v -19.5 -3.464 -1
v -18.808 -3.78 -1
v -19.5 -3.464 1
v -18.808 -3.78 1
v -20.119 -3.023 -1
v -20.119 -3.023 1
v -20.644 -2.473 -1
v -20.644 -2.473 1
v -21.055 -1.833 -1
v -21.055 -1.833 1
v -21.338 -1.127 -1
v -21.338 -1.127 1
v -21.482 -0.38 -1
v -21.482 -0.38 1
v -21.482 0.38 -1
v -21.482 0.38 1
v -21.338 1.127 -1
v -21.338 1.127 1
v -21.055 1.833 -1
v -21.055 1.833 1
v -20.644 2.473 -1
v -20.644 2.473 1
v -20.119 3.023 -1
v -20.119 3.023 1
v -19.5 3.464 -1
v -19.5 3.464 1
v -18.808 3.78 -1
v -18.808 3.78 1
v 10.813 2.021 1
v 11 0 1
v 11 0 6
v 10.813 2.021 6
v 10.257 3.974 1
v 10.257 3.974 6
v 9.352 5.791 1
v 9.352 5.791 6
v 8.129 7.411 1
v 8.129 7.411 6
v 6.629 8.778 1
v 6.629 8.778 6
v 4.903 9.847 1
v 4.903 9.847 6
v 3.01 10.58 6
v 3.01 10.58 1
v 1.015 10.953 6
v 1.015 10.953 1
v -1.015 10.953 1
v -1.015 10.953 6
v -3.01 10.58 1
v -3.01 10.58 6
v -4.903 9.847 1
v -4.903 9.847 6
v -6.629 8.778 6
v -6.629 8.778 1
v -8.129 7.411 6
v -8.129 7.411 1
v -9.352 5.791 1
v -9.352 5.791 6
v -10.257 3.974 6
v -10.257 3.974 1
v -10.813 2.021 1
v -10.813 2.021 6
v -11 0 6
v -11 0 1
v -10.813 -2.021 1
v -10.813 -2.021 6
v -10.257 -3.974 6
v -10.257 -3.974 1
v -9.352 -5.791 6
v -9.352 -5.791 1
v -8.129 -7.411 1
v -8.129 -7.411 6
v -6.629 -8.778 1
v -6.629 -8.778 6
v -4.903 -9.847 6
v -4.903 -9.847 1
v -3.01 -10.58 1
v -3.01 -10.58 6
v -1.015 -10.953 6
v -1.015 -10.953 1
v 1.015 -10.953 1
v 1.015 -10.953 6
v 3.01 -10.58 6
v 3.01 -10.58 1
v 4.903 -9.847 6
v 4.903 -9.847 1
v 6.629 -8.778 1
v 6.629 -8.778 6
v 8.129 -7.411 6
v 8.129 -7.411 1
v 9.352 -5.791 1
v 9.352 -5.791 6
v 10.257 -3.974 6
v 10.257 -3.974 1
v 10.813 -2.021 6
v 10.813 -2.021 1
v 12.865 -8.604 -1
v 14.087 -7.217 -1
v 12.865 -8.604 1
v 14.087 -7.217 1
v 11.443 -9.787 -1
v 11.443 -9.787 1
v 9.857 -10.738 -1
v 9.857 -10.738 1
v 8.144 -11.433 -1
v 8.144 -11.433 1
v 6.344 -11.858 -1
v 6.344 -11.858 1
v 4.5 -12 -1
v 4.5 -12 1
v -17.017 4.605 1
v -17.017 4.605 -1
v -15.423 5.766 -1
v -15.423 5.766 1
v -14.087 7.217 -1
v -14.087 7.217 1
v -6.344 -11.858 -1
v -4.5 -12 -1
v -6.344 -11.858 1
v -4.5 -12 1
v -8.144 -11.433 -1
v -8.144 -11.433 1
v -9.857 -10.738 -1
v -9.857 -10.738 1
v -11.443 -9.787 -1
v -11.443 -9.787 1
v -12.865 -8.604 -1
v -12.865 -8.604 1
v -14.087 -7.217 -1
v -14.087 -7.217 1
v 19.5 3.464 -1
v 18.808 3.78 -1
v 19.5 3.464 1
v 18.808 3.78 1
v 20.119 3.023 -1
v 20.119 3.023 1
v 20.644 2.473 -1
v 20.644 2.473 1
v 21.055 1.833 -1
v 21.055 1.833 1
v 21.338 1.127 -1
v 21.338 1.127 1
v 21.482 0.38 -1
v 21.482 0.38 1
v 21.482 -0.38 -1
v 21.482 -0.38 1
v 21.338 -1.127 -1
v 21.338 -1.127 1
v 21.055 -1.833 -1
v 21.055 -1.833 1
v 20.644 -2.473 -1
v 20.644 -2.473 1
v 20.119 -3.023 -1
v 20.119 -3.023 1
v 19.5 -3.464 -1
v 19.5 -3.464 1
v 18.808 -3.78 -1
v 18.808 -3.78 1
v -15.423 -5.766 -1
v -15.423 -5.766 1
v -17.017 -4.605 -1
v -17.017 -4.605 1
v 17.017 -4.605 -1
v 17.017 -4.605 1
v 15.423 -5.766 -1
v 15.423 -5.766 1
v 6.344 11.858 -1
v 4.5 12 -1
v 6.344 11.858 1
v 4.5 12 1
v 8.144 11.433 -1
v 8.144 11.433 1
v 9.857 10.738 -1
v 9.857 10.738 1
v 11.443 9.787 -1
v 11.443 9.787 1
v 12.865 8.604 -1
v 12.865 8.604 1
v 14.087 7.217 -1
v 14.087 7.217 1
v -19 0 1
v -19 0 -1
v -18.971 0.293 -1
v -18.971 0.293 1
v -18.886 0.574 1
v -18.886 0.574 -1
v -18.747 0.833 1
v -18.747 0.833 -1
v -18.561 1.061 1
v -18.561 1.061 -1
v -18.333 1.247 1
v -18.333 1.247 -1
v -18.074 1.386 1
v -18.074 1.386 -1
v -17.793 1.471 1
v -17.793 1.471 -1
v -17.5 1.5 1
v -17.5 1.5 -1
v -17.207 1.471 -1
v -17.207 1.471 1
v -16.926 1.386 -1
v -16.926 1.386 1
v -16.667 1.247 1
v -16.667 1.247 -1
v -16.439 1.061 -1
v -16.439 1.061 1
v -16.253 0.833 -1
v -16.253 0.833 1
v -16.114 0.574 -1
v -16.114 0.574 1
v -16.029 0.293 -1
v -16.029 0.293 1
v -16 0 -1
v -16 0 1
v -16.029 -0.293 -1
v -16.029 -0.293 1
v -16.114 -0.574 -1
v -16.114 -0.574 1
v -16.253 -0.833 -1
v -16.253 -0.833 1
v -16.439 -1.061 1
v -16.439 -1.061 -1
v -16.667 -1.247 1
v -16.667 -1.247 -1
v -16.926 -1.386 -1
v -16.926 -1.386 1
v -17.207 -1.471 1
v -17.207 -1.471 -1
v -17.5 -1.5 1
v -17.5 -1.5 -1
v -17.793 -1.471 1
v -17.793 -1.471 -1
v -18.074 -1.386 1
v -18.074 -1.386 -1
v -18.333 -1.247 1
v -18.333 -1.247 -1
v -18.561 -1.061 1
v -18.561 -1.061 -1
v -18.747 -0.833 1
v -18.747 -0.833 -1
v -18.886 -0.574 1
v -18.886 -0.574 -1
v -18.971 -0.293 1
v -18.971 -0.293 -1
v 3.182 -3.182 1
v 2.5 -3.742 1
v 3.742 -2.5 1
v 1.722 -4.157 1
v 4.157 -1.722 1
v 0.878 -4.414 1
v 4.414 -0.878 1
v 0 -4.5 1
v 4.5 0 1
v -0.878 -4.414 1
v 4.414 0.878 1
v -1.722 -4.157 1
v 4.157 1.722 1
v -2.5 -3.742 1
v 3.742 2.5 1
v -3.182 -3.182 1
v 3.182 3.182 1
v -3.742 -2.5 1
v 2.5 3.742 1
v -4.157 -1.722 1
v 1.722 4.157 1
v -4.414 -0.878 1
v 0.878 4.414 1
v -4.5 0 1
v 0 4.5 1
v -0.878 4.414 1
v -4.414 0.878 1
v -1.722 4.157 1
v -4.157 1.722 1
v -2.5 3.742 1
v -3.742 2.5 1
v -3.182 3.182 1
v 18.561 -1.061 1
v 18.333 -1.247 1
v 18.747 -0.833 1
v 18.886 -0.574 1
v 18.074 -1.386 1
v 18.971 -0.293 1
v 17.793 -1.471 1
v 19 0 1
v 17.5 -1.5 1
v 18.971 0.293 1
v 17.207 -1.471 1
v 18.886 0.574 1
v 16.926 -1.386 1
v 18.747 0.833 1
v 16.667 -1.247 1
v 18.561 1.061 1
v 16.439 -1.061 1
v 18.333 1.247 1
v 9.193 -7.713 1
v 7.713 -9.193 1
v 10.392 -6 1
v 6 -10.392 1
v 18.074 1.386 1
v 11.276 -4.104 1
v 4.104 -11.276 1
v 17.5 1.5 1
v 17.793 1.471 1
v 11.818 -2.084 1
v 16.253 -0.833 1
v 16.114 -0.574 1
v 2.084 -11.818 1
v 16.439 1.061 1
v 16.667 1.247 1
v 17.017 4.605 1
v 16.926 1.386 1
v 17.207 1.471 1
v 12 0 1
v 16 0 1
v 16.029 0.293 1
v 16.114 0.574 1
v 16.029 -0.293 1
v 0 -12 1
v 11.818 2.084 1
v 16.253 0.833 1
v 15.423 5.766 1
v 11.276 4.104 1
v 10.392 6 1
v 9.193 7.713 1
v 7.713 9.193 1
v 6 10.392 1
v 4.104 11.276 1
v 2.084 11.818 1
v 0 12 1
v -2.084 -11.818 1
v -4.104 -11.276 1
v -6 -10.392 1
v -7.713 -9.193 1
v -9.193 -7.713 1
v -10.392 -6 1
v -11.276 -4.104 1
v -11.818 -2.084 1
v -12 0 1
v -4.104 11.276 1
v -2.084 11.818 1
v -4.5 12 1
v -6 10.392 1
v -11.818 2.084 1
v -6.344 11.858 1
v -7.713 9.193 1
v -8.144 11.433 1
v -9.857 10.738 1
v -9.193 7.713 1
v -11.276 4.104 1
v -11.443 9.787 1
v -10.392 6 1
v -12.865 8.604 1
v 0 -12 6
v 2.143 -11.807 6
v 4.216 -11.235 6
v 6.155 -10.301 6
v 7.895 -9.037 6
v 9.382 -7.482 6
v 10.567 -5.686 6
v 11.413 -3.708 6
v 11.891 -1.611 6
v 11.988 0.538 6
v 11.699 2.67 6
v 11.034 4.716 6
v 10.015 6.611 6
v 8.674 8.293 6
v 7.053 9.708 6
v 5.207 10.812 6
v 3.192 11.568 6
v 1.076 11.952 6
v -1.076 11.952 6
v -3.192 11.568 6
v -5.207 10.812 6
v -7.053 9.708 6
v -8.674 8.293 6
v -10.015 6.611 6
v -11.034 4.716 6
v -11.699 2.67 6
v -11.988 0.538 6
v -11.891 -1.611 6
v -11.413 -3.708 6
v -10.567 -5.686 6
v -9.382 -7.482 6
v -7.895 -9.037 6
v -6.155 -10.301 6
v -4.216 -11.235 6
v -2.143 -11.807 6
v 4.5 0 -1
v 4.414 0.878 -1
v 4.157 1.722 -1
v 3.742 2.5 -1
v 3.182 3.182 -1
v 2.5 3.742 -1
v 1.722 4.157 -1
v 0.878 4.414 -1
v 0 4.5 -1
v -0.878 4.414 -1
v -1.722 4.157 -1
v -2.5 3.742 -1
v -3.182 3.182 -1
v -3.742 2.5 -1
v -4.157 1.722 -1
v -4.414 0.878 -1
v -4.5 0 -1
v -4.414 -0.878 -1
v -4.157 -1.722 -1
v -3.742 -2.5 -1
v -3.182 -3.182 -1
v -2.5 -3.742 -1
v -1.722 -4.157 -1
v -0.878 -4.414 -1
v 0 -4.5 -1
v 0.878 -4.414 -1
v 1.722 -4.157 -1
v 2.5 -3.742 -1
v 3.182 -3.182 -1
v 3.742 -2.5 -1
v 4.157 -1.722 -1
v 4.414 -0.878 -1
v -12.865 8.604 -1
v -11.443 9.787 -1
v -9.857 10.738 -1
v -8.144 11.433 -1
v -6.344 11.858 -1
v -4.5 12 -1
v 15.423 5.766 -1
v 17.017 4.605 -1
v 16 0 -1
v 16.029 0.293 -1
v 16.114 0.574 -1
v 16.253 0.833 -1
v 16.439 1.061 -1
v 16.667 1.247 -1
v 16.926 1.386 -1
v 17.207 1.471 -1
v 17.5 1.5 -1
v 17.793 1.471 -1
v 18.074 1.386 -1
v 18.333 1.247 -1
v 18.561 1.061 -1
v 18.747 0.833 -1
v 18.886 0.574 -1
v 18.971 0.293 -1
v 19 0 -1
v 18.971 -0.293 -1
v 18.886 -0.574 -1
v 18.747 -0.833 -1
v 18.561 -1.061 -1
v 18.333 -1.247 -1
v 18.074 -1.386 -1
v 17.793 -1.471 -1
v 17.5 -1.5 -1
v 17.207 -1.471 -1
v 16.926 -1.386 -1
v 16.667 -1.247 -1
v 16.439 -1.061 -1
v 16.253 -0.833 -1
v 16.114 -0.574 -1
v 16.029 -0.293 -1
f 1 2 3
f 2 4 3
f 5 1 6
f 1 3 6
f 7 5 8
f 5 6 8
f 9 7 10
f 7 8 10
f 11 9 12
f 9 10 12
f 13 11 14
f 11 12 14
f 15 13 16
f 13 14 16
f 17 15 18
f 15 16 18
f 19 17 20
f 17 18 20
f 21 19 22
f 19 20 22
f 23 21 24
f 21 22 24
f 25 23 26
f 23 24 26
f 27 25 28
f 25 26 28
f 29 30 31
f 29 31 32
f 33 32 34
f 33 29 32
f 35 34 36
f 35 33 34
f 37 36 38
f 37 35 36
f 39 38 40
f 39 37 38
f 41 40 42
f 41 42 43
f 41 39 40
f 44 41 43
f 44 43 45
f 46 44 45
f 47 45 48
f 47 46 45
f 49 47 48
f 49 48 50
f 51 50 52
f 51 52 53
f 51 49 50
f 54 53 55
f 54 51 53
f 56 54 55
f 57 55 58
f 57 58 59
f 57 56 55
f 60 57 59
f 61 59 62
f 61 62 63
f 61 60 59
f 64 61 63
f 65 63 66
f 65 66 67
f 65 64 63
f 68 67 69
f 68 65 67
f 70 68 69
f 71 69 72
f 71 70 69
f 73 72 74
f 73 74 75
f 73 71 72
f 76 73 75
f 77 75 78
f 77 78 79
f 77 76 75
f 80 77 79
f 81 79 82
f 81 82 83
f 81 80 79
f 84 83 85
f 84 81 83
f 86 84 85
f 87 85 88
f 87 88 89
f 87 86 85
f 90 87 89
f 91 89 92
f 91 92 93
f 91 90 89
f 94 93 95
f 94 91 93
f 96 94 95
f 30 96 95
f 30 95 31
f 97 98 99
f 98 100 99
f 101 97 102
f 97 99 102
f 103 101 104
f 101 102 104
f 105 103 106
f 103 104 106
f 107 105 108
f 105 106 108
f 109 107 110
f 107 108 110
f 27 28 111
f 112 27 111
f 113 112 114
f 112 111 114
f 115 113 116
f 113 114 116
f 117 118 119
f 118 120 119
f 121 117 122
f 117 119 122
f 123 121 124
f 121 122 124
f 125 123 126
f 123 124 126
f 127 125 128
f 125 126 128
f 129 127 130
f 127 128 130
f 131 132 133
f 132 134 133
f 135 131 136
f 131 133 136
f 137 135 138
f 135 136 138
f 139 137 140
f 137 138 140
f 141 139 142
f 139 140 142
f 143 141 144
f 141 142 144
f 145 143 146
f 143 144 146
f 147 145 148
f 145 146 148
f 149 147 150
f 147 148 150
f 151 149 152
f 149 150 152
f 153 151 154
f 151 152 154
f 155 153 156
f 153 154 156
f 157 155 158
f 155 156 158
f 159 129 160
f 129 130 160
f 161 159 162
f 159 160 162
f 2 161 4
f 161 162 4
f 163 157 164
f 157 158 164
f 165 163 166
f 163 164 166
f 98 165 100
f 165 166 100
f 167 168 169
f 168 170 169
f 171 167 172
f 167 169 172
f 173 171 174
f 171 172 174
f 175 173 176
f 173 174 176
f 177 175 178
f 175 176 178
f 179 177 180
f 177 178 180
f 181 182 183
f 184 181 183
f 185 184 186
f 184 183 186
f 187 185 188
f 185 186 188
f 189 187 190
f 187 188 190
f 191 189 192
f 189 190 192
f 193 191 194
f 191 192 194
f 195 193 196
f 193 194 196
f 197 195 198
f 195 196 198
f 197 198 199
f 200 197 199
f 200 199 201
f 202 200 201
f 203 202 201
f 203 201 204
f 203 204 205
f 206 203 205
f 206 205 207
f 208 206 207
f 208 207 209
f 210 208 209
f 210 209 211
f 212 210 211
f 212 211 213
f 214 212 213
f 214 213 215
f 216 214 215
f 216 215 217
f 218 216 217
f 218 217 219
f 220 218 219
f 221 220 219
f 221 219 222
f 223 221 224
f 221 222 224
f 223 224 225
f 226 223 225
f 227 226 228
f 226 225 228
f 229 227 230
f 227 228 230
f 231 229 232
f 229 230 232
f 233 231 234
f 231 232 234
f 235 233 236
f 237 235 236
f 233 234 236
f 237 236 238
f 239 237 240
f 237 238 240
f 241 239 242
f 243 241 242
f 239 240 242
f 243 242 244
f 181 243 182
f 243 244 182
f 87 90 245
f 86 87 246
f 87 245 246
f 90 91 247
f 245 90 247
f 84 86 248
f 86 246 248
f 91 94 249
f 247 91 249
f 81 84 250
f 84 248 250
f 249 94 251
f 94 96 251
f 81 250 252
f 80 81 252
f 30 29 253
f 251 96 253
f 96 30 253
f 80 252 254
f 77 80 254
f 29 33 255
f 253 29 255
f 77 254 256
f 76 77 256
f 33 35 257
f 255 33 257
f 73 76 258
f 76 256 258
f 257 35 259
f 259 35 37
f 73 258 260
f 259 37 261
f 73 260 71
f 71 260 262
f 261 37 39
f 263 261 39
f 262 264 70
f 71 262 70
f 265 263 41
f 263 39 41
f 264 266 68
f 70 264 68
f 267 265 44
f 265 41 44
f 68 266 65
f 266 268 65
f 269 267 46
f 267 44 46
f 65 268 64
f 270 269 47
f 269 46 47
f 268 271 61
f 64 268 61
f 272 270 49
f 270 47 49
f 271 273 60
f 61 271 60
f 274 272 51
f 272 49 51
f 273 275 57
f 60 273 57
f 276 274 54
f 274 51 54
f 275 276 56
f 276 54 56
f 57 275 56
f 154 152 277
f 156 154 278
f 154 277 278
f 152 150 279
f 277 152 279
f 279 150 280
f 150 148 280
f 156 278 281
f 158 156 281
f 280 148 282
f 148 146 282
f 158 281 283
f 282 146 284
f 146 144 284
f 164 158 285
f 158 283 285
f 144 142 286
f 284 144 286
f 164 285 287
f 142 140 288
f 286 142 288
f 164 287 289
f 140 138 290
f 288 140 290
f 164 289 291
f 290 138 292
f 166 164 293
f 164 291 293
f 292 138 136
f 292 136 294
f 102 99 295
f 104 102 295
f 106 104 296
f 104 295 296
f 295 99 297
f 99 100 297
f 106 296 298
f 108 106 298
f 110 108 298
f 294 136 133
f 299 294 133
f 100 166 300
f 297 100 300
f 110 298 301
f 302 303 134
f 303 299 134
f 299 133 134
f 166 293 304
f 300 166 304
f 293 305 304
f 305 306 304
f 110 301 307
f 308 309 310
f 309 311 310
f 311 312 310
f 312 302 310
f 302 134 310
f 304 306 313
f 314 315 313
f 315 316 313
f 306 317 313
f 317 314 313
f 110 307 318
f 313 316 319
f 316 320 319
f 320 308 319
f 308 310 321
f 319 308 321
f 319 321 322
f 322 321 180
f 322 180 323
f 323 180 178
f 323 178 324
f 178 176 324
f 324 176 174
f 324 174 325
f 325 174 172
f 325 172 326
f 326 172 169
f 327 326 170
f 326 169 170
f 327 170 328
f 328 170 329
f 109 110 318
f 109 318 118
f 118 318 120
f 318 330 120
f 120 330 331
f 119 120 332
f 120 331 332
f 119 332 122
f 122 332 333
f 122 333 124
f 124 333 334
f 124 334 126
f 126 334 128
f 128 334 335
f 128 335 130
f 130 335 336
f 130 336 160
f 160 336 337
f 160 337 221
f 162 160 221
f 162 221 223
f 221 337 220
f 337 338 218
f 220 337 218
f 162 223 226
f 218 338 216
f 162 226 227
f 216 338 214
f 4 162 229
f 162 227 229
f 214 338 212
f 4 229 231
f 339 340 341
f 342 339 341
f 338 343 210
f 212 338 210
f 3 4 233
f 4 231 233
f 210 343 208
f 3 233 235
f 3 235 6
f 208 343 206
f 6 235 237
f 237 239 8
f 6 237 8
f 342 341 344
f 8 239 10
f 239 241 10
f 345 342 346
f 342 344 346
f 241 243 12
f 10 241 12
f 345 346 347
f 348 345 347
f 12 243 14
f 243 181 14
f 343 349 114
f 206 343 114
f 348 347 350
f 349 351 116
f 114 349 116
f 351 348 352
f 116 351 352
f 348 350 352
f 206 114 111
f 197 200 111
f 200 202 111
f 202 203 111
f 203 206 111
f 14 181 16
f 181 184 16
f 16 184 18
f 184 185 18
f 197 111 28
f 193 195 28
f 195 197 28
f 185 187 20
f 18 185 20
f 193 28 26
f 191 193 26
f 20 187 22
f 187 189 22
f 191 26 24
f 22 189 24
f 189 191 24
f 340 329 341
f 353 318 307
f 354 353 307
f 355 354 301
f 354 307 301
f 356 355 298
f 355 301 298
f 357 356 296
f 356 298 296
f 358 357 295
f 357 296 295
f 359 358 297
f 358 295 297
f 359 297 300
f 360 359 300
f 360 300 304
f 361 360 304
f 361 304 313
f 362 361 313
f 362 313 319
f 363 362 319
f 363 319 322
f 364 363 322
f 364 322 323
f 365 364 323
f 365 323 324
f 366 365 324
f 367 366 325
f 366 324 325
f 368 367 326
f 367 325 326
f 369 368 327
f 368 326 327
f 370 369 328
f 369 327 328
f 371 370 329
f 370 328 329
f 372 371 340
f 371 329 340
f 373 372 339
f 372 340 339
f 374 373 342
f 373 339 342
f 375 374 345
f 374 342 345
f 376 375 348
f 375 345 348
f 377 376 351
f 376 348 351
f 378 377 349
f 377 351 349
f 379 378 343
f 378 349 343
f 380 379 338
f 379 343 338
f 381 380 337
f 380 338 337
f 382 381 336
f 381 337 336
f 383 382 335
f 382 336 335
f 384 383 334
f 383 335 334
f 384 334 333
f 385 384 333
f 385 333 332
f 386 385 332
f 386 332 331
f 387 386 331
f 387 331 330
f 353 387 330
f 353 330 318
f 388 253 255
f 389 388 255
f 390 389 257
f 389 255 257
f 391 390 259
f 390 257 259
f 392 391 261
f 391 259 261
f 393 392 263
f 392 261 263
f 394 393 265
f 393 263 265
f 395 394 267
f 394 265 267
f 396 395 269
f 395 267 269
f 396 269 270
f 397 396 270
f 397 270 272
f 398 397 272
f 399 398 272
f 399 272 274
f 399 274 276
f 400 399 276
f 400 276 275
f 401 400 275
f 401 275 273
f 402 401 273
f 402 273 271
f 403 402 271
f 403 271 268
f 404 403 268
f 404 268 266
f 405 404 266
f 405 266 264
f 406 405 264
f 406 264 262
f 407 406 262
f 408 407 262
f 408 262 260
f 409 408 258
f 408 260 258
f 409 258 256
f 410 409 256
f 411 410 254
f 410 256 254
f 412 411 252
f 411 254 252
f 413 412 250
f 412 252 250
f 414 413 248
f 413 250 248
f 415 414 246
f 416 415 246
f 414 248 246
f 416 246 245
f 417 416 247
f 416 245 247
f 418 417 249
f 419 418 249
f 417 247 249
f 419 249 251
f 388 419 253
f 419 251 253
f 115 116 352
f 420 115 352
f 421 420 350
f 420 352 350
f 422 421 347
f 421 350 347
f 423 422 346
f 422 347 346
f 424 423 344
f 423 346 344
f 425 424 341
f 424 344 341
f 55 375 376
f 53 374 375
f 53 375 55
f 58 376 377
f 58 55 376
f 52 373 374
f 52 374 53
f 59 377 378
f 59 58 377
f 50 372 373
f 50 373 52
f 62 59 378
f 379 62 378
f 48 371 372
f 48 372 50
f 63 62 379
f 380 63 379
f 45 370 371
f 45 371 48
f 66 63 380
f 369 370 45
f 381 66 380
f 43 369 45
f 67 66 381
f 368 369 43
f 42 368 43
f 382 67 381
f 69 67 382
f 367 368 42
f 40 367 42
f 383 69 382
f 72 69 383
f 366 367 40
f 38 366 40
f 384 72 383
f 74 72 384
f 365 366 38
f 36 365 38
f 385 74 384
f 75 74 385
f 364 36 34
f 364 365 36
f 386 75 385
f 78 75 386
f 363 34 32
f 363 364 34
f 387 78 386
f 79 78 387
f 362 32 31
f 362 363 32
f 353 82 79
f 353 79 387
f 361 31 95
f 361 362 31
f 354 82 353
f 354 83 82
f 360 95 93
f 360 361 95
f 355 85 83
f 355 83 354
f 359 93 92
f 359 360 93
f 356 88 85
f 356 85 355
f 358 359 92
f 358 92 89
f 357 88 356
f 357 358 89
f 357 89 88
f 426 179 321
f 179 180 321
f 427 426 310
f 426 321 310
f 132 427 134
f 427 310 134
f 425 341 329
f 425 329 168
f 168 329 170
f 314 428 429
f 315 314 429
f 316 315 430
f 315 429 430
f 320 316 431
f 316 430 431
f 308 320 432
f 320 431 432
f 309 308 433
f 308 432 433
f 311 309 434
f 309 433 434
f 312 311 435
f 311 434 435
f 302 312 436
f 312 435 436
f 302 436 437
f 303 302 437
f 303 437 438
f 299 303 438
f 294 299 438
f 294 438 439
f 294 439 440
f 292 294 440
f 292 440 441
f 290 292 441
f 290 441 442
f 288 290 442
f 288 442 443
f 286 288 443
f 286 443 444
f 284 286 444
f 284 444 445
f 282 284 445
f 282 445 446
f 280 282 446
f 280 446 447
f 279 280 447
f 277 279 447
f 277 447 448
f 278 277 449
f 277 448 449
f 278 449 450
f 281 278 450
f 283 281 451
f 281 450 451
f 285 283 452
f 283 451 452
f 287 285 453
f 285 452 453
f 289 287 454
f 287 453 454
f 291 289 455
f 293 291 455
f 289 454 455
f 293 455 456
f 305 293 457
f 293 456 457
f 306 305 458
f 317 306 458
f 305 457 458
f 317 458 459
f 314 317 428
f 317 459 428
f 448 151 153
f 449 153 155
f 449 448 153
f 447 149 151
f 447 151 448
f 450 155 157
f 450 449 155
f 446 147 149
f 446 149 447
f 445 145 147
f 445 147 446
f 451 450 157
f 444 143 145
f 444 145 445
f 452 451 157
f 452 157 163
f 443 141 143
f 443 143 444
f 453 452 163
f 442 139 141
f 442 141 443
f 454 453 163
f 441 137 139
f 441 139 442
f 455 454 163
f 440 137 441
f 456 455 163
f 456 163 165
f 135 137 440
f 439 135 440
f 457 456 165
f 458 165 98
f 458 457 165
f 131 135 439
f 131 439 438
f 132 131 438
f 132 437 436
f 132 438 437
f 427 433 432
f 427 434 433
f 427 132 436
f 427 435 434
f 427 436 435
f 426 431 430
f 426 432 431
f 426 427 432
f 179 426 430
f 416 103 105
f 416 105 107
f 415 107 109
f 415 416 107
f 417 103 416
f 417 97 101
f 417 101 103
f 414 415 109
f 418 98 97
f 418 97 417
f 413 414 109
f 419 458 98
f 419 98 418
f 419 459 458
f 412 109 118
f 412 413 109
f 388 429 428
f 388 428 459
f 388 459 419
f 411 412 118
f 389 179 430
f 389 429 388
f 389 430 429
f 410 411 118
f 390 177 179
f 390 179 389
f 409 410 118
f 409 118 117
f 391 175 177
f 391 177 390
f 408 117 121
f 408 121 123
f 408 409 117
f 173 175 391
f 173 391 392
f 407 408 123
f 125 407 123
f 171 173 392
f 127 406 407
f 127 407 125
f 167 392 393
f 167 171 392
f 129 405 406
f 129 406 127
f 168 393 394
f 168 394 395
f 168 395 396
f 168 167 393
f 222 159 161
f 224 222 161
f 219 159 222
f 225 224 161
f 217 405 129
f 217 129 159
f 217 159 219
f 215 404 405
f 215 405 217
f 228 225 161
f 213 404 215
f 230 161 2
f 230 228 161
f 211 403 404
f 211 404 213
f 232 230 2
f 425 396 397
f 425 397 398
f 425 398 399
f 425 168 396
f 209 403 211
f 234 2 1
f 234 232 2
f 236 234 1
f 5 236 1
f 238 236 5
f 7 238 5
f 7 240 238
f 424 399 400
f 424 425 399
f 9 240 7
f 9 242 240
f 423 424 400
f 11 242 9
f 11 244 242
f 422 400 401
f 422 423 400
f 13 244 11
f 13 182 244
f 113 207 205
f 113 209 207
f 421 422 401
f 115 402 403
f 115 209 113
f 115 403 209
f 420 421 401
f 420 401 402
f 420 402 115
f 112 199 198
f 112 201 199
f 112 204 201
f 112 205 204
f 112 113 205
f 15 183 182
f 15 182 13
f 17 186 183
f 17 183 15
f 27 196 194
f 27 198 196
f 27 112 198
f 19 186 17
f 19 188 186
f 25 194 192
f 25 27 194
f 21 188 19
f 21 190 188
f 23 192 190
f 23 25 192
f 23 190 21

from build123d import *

# Parameters (mm, degrees)
EXTRUDE_2_DEPTH     = 1
SKETCH_3_R          = 12
SKETCH_3_R_2        = 11
EXTRUDE_3_DEPTH     = 5
SKETCH_4_R          = 4.5
CUT_EXTRUDE_1_DEPTH = 26.124689053
SKETCH_5_R          = 1.5
CUT_EXTRUDE_2_DEPTH = 26.597851472


with BuildPart() as part:
    # 草图2 → 凸台-拉伸2 (new, symmetric)
    with BuildSketch(Plane.XY):
        with BuildLine():
            Line((-4.5, 12), (4.5, 12))
            ThreePointArc((4.5, 12), (9.857189903, 10.7378078), (14.087412587, 7.216752724))
            ThreePointArc((14.087412587, 7.216752724), (16.191153731, 5.146301215), (18.807692308, 3.780203808))
            ThreePointArc((18.807692308, 3.780203808), (21.5, 0), (18.807692308, -3.780203808))
            ThreePointArc((18.807692308, -3.780203808), (16.191153731, -5.146301215), (14.087412587, -7.216752724))
            ThreePointArc((14.087412587, -7.216752724), (9.857189903, -10.7378078), (4.5, -12))
            Line((4.5, -12), (-4.5, -12))
            ThreePointArc((-4.5, -12), (-9.857189903, -10.7378078), (-14.087412587, -7.216752724))
            ThreePointArc((-14.087412587, -7.216752724), (-16.191153731, -5.146301215), (-18.807692308, -3.780203808))
            ThreePointArc((-18.807692308, -3.780203808), (-21.5, 0), (-18.807692308, 3.780203808))
            ThreePointArc((-18.807692308, 3.780203808), (-16.191153731, 5.146301215), (-14.087412587, 7.216752724))
            ThreePointArc((-14.087412587, 7.216752724), (-9.857189903, 10.7378078), (-4.5, 12))
        make_face()
    extrude(amount=EXTRUDE_2_DEPTH, both=True)

    # 草图3 → 凸台-拉伸3 (add)
    with BuildSketch(Plane.XY.offset(1)):
        with Locations(Location((0, 0, 0), (0, 0, 270))):
            Circle(SKETCH_3_R)
        Circle(SKETCH_3_R_2, mode=Mode.SUBTRACT)
    extrude(amount=EXTRUDE_3_DEPTH)

    # 草图4 → 切除-拉伸1 (cut, through all)
    with BuildSketch(Plane.XY.offset(1)):
        Circle(SKETCH_4_R)
    extrude(amount=-CUT_EXTRUDE_1_DEPTH, mode=Mode.SUBTRACT)

    # 草图5 → 切除-拉伸2 (cut, through all)
    with BuildSketch(Plane(origin=(0, 0, -1), x_dir=(-1, 0, 0), z_dir=(0, 0, -1))):
        with Locations((17.5, 0)):
            Circle(SKETCH_5_R)
        with Locations((-17.5, 0)):
            Circle(SKETCH_5_R)
    extrude(amount=-CUT_EXTRUDE_2_DEPTH, mode=Mode.SUBTRACT)


solid = part.part
